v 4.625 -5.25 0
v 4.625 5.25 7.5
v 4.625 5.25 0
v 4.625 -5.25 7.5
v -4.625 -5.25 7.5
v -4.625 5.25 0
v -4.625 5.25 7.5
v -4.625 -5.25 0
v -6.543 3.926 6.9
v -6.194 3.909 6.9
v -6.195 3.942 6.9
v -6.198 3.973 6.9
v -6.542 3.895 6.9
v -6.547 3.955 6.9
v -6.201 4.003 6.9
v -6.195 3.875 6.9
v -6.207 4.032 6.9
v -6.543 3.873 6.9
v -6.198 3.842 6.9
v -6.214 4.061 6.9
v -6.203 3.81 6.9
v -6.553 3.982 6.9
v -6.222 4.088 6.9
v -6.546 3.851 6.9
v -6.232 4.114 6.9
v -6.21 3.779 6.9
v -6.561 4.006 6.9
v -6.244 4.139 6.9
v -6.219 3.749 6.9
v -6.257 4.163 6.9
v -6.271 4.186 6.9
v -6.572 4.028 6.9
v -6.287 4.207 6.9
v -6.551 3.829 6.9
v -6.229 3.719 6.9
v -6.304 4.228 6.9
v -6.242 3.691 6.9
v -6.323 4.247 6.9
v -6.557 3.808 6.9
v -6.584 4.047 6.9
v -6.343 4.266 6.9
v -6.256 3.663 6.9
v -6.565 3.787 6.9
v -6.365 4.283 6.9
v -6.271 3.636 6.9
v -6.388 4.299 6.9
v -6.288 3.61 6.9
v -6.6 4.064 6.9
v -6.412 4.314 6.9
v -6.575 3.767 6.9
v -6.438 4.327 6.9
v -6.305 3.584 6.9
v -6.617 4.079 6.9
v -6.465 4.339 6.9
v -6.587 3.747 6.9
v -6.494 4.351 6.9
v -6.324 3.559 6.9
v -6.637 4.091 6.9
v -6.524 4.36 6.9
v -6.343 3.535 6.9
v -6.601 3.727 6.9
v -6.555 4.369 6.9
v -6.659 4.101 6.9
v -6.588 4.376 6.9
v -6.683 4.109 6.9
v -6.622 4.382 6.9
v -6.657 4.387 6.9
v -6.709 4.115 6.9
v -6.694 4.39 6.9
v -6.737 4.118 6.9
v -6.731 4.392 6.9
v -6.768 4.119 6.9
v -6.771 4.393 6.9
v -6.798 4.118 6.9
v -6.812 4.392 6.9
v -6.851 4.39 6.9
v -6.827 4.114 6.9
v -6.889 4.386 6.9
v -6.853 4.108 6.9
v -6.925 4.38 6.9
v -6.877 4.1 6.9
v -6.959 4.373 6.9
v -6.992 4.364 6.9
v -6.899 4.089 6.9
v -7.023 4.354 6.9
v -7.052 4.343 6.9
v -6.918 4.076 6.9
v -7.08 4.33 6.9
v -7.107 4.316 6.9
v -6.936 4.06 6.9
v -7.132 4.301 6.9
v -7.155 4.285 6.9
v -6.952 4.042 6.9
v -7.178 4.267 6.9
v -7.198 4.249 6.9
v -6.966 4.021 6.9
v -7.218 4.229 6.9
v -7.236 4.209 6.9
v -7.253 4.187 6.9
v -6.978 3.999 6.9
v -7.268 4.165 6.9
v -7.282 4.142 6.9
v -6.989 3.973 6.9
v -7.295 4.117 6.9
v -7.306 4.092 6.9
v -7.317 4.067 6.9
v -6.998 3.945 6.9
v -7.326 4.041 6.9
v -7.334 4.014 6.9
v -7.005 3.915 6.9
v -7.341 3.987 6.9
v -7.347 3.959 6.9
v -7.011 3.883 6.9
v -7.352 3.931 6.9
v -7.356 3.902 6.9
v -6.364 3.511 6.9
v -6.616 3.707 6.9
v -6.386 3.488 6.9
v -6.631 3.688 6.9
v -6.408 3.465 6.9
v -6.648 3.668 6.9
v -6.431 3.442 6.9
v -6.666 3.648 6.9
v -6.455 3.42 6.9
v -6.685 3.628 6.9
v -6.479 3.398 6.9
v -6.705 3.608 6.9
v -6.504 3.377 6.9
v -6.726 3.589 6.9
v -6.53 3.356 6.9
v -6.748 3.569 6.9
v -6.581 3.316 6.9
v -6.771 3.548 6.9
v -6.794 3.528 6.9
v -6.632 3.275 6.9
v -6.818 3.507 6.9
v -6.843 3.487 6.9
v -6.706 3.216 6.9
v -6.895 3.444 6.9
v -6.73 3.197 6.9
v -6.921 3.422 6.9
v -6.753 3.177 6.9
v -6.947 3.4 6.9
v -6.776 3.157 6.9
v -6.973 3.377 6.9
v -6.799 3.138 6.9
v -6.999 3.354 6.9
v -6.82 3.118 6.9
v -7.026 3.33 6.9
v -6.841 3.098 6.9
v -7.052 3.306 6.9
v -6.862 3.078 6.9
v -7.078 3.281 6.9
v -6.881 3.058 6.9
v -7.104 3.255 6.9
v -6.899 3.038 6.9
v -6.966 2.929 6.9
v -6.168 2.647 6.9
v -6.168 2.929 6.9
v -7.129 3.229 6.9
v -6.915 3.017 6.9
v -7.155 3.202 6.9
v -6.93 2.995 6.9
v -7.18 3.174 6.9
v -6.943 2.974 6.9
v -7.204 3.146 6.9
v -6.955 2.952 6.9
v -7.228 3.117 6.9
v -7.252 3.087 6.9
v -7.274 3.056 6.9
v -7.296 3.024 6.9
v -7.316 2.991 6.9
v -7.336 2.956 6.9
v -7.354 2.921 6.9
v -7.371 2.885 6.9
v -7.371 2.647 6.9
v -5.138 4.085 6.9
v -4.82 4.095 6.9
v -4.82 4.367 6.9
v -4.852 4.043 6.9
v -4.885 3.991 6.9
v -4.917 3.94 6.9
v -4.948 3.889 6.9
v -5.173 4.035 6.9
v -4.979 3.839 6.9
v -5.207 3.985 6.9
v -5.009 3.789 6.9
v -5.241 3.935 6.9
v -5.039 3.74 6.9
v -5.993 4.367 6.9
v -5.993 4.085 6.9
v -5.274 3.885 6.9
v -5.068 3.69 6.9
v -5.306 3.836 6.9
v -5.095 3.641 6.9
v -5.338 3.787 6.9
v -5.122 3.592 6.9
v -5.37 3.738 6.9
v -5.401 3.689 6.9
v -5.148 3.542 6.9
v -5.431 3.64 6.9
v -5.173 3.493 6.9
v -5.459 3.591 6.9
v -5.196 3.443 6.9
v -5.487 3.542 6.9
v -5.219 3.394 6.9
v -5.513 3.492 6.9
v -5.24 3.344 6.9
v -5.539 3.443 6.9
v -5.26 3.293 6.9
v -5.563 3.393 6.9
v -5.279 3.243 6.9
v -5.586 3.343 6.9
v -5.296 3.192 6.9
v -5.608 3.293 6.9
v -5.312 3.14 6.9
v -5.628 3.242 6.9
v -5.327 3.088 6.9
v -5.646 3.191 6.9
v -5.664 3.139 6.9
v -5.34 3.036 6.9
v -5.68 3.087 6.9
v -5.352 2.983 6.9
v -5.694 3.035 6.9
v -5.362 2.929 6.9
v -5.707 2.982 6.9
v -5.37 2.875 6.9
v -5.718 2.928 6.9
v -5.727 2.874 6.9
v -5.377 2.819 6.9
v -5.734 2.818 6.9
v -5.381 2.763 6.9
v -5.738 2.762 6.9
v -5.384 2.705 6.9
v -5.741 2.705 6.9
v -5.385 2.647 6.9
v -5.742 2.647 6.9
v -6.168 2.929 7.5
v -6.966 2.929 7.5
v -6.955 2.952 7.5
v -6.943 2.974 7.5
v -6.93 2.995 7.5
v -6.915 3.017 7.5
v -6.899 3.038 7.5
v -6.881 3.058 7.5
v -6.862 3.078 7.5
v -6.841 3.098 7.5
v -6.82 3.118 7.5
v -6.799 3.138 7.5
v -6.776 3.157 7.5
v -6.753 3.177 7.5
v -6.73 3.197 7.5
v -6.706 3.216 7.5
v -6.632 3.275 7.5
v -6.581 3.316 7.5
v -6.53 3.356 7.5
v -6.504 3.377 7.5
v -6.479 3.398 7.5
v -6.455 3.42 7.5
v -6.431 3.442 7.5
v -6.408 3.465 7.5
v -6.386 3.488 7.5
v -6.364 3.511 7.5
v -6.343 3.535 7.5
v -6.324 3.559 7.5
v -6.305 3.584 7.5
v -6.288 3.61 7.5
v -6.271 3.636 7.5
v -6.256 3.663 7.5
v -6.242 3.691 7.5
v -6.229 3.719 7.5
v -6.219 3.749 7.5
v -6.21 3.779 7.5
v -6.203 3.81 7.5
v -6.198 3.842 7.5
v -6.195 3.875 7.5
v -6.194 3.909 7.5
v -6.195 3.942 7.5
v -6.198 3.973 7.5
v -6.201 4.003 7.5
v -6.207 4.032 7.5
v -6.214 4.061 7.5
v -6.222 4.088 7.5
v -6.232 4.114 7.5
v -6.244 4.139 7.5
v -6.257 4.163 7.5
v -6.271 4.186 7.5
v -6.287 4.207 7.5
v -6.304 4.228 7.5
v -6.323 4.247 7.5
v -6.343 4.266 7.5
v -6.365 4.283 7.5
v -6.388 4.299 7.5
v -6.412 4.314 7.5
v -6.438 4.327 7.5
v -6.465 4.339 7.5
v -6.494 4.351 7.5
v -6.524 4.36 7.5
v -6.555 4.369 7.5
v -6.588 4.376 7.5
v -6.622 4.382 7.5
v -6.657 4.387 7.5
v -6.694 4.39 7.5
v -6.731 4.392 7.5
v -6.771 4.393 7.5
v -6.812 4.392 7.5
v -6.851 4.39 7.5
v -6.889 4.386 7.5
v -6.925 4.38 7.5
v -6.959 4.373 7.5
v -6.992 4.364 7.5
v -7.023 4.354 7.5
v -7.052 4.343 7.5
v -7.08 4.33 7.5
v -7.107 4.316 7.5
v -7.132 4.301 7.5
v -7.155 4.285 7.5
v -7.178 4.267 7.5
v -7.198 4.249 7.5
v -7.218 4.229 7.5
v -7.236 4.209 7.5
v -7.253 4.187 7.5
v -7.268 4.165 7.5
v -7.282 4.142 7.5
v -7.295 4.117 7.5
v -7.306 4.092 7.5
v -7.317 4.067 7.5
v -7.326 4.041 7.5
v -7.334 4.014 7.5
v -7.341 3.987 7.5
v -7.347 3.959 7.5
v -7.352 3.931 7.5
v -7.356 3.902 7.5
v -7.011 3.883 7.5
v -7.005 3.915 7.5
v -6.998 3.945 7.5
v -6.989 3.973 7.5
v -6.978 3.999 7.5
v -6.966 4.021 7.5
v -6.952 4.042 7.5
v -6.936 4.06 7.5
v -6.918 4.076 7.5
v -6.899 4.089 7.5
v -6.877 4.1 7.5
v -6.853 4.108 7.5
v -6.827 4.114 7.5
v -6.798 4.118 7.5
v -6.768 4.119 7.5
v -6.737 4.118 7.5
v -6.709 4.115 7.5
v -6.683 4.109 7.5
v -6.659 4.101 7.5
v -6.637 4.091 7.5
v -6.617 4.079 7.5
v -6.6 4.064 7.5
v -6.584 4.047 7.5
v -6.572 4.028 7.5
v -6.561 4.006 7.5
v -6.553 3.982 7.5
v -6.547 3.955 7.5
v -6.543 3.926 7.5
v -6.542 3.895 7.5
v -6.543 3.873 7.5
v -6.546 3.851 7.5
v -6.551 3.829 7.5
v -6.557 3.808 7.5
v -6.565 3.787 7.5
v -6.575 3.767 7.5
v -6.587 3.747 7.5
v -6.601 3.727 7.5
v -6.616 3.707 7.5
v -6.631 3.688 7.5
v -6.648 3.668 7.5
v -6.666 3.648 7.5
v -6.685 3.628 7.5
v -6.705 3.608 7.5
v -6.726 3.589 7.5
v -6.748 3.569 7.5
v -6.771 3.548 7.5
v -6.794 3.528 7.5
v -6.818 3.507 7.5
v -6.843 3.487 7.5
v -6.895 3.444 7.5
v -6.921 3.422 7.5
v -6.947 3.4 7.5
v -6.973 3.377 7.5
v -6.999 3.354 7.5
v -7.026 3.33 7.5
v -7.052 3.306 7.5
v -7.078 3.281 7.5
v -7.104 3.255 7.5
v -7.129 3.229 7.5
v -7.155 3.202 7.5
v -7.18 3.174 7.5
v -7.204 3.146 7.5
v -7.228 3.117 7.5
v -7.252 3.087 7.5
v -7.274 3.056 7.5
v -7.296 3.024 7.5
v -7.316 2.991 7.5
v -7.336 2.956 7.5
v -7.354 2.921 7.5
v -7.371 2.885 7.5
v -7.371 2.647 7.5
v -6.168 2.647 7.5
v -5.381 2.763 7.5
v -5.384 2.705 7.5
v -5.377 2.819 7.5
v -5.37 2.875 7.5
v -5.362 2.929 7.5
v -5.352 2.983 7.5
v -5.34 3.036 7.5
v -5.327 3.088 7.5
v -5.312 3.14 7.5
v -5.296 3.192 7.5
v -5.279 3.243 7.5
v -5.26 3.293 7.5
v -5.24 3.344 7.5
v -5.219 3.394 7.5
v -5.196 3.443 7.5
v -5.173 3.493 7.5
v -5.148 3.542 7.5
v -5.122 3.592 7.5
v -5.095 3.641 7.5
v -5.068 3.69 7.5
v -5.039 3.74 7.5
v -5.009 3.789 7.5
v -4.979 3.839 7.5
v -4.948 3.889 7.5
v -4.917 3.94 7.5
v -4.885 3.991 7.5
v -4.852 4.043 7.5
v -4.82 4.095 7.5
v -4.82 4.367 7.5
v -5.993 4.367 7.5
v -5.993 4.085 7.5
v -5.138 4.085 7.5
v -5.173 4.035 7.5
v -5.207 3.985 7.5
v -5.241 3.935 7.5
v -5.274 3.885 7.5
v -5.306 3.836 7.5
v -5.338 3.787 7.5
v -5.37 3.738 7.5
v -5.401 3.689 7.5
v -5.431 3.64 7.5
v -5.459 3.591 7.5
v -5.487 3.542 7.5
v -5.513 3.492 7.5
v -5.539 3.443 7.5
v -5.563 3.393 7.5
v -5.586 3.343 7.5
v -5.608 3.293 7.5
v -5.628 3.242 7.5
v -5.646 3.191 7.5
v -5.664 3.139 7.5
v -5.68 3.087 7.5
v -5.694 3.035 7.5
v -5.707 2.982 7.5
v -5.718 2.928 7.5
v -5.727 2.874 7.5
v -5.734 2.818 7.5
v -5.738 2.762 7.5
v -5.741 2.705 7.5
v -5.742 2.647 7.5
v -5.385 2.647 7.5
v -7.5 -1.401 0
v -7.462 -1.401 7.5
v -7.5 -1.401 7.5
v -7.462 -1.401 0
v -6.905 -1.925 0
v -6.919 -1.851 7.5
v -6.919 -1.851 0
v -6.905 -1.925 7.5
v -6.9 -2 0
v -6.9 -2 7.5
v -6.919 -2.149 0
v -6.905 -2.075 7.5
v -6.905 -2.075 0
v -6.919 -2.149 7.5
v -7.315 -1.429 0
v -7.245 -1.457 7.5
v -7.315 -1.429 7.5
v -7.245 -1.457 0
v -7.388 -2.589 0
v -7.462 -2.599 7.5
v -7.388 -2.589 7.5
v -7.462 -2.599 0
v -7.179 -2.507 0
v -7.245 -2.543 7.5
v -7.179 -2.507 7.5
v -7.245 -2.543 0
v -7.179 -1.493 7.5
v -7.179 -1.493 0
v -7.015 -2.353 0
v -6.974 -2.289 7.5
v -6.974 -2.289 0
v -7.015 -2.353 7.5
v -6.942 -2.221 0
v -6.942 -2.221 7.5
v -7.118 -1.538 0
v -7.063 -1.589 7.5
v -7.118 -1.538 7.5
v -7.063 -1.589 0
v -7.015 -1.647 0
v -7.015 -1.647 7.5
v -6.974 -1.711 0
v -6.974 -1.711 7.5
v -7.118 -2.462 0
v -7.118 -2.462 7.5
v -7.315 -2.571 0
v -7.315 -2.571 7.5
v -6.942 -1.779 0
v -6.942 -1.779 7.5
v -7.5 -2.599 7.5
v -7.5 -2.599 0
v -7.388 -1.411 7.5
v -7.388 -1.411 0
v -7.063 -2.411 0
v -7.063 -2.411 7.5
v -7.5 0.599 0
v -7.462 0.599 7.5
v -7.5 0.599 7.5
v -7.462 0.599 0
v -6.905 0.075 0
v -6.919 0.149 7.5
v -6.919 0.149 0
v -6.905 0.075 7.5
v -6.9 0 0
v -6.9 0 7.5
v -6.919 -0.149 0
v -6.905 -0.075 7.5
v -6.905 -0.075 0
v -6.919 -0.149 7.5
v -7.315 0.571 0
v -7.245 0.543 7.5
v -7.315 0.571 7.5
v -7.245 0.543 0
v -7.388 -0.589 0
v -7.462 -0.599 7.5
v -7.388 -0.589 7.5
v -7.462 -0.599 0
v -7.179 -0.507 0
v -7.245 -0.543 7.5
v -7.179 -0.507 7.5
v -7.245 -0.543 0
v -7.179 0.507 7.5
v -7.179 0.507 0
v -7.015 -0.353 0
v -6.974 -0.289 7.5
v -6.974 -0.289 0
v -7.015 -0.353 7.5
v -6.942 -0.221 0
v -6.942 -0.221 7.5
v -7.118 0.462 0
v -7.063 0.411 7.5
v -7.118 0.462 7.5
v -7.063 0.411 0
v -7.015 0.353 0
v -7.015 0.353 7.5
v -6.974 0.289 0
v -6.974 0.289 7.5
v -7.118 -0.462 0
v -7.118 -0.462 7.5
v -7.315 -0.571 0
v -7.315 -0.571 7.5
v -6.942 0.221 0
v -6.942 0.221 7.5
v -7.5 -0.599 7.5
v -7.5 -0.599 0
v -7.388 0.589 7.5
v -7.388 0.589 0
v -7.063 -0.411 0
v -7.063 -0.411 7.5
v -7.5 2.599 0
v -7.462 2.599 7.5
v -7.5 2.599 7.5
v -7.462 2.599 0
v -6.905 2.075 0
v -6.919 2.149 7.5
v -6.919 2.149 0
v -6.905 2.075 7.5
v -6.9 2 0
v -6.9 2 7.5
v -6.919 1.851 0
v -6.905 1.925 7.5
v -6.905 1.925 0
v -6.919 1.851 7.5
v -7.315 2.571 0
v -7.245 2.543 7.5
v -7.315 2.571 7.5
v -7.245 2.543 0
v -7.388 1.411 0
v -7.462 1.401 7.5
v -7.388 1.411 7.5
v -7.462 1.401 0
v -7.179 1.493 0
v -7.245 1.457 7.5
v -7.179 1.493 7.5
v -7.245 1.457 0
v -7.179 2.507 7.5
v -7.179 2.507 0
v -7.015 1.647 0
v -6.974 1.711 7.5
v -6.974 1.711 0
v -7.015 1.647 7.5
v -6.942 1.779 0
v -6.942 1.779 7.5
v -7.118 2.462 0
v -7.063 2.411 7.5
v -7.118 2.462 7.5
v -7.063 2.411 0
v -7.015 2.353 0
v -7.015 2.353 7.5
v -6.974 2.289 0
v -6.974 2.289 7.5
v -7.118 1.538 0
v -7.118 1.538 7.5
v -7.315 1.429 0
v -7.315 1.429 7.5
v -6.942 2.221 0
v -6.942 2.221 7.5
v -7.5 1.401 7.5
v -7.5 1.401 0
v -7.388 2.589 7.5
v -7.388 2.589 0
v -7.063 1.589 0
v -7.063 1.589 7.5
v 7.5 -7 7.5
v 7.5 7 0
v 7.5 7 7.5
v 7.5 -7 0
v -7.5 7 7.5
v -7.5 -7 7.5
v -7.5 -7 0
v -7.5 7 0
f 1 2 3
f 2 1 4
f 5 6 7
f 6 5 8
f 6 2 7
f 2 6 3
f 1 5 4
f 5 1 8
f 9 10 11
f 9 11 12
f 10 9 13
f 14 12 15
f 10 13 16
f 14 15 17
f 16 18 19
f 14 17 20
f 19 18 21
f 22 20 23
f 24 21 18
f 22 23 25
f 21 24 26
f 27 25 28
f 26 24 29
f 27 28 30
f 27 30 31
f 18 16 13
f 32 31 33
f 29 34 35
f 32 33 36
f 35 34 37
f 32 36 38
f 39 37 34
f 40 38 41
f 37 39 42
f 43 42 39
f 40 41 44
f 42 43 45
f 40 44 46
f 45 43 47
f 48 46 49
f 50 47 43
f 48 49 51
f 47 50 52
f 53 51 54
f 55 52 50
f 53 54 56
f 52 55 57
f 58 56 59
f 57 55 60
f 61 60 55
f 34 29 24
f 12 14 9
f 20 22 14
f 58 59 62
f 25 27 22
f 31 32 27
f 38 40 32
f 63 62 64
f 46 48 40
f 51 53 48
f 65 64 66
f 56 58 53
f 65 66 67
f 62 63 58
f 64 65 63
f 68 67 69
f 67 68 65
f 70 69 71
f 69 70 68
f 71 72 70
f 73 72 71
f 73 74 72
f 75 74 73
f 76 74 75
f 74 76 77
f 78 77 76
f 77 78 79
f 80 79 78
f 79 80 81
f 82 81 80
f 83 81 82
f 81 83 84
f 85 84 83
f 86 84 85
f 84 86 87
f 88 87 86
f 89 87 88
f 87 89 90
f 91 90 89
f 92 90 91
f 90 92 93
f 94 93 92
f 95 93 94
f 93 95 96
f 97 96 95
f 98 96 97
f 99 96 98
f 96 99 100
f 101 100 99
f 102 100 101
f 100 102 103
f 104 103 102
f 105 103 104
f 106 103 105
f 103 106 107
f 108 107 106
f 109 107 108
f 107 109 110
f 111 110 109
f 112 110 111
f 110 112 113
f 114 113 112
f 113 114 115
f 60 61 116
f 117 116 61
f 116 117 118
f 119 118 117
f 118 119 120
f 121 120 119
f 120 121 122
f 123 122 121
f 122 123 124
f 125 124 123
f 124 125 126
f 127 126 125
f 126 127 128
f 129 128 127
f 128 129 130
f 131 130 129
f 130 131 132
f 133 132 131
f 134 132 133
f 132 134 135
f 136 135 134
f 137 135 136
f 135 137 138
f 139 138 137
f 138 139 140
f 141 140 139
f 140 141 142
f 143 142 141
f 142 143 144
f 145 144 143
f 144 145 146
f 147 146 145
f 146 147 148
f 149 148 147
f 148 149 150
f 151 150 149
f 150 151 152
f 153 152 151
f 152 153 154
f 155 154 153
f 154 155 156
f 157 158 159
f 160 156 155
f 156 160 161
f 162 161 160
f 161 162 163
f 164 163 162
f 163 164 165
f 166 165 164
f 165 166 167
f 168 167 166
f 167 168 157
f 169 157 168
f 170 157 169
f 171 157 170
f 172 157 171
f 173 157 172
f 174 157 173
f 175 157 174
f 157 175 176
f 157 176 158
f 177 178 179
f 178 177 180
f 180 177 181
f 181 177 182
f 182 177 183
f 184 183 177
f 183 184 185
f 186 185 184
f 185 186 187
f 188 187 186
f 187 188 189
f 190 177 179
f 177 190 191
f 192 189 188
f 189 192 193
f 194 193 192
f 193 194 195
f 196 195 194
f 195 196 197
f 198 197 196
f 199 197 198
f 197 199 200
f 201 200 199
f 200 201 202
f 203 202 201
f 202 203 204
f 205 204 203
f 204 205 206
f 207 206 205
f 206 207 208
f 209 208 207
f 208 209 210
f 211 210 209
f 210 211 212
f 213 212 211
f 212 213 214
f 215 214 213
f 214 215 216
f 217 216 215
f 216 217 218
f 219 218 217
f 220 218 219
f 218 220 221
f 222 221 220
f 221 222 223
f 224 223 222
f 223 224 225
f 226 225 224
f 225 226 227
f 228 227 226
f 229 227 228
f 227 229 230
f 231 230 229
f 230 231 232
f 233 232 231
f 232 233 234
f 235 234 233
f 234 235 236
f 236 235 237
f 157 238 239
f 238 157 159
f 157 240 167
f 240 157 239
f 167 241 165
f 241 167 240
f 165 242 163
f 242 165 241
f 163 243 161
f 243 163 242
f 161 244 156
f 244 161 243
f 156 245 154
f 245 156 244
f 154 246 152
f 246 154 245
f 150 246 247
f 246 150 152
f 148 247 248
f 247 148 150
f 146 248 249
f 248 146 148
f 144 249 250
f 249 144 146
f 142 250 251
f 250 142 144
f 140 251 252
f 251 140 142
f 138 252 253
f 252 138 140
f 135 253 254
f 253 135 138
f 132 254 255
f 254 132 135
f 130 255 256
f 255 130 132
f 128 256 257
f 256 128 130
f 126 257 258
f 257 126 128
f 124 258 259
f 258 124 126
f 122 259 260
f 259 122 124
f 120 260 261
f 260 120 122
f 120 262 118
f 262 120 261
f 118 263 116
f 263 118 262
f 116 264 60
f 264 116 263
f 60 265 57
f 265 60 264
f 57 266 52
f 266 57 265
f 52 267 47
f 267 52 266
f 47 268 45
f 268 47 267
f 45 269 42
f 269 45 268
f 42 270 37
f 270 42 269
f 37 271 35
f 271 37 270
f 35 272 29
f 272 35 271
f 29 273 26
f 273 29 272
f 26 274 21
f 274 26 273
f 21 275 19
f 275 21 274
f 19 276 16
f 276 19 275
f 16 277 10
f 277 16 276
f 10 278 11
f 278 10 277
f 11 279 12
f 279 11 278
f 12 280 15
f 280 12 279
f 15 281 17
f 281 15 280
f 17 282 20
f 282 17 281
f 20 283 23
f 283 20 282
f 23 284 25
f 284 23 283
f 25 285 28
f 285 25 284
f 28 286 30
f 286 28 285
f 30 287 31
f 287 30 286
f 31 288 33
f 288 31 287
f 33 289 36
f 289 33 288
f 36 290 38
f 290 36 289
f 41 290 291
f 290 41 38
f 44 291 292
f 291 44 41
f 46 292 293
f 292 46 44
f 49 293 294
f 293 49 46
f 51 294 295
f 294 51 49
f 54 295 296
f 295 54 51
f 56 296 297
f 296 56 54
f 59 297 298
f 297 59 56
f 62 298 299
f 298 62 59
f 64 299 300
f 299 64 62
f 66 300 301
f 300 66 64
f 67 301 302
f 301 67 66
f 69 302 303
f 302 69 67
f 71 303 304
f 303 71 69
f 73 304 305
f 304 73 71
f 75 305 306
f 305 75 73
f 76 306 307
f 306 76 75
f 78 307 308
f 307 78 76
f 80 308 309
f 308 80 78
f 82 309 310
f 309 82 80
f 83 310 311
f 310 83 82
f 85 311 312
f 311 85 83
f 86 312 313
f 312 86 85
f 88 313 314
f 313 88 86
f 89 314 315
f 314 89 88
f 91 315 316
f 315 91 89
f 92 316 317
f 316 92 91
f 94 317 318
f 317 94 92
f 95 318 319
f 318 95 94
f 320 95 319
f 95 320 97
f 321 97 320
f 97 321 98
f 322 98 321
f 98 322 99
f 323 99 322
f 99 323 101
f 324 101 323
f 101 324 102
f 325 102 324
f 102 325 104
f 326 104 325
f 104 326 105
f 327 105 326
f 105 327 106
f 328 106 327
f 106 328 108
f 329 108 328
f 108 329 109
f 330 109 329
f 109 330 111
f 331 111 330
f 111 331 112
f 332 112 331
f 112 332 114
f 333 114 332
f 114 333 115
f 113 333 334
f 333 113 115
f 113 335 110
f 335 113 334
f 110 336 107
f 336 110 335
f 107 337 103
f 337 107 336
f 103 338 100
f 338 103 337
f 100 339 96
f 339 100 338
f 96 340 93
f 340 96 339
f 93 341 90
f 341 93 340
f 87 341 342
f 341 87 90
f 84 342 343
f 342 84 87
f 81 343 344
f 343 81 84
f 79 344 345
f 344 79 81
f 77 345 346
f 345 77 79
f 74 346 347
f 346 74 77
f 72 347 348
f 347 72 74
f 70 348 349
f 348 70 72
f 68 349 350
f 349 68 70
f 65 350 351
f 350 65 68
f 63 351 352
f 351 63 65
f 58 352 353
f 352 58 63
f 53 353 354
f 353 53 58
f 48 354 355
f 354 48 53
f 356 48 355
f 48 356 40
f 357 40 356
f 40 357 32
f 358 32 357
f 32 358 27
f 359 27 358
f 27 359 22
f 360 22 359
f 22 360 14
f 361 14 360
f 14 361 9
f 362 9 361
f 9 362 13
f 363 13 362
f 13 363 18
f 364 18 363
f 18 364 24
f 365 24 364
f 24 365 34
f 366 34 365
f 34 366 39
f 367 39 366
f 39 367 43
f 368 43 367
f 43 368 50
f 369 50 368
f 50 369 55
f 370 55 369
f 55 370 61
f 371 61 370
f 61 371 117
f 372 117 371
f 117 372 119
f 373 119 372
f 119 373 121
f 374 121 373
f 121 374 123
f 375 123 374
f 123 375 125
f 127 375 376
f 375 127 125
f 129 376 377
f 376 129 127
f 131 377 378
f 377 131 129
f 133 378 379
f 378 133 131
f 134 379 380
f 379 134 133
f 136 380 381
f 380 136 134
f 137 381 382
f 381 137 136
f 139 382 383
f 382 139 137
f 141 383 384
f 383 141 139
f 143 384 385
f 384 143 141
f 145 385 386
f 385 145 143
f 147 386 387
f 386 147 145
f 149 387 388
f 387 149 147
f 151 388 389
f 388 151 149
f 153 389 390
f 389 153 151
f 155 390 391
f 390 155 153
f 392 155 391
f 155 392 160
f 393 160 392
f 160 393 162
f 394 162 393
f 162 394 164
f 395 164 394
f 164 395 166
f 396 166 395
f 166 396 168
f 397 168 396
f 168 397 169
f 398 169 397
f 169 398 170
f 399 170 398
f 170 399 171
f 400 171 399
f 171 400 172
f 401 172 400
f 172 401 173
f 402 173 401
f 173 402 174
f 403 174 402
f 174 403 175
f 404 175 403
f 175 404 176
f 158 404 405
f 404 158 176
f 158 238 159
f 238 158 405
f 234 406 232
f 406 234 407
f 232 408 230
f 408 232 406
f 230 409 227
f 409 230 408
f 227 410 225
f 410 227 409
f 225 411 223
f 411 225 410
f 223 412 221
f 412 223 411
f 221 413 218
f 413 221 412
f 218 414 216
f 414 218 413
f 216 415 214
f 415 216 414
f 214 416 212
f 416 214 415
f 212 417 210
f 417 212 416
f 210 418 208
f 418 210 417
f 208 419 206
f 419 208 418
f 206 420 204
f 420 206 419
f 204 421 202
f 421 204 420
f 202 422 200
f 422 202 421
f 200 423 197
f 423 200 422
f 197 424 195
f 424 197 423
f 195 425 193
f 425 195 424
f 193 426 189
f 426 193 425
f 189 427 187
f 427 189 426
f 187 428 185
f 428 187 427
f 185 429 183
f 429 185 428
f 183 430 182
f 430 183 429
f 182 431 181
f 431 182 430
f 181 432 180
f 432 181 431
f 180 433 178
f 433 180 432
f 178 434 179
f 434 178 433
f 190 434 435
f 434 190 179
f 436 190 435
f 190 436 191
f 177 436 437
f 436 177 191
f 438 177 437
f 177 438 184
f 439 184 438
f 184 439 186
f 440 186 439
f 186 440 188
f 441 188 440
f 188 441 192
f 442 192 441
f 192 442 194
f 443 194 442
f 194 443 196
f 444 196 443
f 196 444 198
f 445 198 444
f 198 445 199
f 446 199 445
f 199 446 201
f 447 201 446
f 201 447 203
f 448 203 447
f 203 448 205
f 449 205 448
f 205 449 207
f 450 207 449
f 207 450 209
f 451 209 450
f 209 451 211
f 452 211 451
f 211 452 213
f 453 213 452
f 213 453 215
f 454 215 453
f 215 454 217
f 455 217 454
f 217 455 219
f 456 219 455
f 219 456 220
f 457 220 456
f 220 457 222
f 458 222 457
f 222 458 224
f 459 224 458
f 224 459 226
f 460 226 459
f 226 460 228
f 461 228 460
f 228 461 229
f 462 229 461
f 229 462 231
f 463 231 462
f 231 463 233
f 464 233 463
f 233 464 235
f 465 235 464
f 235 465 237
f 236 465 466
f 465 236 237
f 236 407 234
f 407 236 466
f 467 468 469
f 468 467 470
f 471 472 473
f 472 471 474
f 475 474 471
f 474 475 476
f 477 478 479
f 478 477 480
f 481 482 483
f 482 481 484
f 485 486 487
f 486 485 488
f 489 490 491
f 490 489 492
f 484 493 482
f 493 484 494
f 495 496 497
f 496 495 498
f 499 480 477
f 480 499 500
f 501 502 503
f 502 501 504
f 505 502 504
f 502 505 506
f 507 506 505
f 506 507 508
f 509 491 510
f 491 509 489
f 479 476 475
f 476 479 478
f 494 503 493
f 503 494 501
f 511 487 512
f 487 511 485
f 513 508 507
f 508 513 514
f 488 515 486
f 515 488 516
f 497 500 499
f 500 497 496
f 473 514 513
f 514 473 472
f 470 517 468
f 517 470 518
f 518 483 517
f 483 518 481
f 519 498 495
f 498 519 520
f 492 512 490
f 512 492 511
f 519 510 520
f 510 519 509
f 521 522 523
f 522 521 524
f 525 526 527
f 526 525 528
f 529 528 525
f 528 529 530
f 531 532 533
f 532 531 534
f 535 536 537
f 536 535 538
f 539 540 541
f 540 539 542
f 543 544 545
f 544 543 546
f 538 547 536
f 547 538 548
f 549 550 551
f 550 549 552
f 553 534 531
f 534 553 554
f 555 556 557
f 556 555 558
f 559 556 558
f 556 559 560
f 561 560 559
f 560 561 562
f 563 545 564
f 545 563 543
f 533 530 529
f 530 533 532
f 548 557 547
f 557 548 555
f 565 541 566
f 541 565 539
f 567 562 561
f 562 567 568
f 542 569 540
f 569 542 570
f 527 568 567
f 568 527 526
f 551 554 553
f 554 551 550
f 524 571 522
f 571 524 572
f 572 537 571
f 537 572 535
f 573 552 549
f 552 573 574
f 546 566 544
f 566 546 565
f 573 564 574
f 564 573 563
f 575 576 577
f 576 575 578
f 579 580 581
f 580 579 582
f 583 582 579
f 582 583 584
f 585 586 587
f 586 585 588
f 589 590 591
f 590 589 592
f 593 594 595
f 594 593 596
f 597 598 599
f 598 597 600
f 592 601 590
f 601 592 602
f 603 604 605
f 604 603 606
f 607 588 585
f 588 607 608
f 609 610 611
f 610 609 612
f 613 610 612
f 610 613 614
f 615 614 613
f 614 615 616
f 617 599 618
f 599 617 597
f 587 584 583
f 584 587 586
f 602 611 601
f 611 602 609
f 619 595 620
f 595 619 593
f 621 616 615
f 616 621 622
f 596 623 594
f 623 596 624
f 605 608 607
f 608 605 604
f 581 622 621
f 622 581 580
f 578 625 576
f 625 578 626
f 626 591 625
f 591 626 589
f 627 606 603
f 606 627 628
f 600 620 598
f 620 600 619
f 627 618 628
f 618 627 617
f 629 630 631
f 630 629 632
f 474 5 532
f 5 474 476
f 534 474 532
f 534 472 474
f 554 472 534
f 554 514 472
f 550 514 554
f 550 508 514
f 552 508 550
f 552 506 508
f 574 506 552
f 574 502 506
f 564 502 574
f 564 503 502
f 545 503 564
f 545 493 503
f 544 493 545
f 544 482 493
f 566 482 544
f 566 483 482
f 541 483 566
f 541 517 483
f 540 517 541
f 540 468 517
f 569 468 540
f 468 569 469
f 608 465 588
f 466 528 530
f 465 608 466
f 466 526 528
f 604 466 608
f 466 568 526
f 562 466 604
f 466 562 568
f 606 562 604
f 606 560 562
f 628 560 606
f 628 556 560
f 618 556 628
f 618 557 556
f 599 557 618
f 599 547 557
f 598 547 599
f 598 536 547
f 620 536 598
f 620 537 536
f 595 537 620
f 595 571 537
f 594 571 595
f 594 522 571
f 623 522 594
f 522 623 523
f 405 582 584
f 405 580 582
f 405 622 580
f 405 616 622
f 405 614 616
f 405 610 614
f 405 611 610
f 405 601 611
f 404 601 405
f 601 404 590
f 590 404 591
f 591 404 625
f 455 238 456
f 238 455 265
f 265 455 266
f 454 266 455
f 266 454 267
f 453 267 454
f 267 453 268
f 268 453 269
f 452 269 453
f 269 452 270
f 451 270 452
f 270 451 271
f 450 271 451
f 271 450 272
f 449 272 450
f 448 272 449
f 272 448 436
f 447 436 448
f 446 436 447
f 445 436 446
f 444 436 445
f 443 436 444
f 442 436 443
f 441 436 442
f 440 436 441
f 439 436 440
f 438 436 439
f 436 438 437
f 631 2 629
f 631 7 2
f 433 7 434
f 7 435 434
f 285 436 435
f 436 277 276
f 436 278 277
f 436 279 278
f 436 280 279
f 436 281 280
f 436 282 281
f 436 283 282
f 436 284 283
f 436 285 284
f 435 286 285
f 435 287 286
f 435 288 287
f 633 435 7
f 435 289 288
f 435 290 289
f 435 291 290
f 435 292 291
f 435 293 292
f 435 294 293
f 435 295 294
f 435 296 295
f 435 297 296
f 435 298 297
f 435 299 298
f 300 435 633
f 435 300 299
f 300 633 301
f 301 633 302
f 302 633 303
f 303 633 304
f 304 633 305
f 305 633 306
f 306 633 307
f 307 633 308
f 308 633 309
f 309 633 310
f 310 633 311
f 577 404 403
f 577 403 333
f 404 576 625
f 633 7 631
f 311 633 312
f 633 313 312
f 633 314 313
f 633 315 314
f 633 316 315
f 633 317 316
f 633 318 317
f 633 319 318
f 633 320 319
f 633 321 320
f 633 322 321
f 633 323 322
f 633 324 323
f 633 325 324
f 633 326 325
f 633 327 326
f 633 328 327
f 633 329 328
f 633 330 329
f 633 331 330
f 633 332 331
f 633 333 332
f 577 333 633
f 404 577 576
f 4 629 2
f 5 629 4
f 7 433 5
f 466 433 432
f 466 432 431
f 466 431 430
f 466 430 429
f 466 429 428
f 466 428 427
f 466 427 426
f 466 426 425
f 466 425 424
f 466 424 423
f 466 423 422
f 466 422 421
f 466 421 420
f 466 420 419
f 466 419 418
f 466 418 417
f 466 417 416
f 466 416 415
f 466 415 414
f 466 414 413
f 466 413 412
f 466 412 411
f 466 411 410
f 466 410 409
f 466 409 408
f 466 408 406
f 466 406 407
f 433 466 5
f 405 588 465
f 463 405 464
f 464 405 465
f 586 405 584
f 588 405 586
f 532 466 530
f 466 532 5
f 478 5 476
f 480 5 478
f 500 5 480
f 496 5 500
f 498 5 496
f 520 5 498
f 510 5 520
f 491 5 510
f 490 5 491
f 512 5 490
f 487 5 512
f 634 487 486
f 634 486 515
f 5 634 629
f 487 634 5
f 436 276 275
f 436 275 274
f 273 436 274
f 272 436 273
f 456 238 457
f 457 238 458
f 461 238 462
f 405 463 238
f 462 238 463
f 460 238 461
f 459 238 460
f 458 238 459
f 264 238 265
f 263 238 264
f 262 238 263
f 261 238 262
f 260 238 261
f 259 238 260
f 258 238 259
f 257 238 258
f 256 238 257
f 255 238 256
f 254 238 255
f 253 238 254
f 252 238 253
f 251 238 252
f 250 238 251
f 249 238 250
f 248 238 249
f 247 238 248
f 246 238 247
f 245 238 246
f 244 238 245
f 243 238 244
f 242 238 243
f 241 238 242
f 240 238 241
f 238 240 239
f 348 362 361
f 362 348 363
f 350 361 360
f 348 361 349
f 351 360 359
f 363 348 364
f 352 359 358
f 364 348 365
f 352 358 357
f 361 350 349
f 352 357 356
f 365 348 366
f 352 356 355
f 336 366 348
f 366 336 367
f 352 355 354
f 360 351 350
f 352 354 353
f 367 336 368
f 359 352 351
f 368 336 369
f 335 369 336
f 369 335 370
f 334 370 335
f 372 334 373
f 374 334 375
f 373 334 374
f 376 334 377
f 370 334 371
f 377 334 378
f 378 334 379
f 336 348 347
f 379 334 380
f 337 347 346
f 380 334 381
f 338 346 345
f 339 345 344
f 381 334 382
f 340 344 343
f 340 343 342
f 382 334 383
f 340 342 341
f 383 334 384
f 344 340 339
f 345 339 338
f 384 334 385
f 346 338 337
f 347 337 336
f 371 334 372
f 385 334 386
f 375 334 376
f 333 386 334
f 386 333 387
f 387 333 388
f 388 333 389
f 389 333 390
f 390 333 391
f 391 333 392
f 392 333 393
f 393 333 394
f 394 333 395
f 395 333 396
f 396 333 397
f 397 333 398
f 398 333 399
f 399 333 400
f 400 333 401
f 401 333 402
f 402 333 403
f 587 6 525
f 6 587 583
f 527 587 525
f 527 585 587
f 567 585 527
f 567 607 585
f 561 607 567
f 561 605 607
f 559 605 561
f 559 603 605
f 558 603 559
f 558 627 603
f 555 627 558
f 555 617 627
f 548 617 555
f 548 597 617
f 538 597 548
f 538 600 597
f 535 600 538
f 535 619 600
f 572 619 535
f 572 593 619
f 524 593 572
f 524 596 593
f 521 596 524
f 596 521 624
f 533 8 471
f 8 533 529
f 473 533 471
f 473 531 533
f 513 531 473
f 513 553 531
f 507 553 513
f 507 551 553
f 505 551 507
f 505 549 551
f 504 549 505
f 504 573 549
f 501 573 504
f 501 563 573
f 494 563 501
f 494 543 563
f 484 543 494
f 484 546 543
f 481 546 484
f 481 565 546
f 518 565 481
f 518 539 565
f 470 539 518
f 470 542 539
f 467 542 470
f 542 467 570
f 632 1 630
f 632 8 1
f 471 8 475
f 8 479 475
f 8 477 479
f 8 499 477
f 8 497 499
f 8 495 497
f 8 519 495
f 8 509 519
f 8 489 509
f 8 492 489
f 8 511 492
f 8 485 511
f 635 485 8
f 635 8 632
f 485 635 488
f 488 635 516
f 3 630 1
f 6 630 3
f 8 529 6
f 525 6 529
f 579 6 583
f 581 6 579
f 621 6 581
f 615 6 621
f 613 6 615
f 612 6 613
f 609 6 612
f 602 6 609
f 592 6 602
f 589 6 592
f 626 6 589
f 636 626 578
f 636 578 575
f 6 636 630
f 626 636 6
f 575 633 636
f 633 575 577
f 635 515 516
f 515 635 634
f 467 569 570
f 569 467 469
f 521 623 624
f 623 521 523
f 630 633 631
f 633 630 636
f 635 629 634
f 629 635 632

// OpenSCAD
$fn = 50;

difference() {
	union() {
		translate(v = [0, -5, 0]) {
			rotate(a = [0, 0, 0]) {
				difference() {
					union() {
						translate(v = [-7.5, -2.0, 0]) {
							cube(size = [15.0, 14.0, 7.5]);
						}
					}
					union() {
						translate(v = [-4.625, -0.25, -0.1]) {
							cube(size = [9.25, 10.5, 7.7]);
						}
						translate(v = [-6.1, 8.5, 6.9]) {
							linear_extrude(height = 0.7) {
								text(font = "Arial:style=Bold", halign = "center", size = 1.8, text = "27", valign = "center");
							}
						}
						translate(v = [-7.5, 3, -0.1]) {
							cylinder(h = 7.7, r = 0.6);
						}
						translate(v = [-7.5, 5, -0.1]) {
							cylinder(h = 7.7, r = 0.6);
						}
						translate(v = [-7.5, 7, -0.1]) {
							cylinder(h = 7.7, r = 0.6);
						}
					}
				}
			}
		}
	}
	union();
}
